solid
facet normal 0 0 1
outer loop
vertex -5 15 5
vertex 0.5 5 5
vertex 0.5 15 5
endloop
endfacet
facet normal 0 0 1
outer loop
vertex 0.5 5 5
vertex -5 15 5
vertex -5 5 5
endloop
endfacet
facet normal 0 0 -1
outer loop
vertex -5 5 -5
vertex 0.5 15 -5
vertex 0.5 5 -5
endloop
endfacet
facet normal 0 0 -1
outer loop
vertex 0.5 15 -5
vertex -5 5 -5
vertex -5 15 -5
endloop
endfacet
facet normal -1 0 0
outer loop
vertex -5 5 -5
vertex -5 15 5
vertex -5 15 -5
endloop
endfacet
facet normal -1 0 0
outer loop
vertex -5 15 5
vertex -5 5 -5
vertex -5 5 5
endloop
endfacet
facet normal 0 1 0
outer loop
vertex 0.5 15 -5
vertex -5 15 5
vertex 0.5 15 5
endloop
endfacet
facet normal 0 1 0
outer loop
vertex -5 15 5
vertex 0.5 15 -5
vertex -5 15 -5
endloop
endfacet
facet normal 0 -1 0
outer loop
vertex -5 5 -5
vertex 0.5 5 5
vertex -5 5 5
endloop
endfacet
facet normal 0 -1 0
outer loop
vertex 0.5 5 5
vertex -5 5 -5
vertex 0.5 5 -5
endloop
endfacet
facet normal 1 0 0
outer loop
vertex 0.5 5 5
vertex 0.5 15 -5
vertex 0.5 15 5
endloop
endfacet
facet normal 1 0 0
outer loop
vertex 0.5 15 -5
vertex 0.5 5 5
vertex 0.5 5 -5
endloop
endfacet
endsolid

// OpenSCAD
translate([0,10,0]) difference() {
    cube(10, center=true);
    translate([6,5.5,0]) cube(11, center=true);
    translate([6,-5.500000000088,0]) cube(11, center=true);
}
